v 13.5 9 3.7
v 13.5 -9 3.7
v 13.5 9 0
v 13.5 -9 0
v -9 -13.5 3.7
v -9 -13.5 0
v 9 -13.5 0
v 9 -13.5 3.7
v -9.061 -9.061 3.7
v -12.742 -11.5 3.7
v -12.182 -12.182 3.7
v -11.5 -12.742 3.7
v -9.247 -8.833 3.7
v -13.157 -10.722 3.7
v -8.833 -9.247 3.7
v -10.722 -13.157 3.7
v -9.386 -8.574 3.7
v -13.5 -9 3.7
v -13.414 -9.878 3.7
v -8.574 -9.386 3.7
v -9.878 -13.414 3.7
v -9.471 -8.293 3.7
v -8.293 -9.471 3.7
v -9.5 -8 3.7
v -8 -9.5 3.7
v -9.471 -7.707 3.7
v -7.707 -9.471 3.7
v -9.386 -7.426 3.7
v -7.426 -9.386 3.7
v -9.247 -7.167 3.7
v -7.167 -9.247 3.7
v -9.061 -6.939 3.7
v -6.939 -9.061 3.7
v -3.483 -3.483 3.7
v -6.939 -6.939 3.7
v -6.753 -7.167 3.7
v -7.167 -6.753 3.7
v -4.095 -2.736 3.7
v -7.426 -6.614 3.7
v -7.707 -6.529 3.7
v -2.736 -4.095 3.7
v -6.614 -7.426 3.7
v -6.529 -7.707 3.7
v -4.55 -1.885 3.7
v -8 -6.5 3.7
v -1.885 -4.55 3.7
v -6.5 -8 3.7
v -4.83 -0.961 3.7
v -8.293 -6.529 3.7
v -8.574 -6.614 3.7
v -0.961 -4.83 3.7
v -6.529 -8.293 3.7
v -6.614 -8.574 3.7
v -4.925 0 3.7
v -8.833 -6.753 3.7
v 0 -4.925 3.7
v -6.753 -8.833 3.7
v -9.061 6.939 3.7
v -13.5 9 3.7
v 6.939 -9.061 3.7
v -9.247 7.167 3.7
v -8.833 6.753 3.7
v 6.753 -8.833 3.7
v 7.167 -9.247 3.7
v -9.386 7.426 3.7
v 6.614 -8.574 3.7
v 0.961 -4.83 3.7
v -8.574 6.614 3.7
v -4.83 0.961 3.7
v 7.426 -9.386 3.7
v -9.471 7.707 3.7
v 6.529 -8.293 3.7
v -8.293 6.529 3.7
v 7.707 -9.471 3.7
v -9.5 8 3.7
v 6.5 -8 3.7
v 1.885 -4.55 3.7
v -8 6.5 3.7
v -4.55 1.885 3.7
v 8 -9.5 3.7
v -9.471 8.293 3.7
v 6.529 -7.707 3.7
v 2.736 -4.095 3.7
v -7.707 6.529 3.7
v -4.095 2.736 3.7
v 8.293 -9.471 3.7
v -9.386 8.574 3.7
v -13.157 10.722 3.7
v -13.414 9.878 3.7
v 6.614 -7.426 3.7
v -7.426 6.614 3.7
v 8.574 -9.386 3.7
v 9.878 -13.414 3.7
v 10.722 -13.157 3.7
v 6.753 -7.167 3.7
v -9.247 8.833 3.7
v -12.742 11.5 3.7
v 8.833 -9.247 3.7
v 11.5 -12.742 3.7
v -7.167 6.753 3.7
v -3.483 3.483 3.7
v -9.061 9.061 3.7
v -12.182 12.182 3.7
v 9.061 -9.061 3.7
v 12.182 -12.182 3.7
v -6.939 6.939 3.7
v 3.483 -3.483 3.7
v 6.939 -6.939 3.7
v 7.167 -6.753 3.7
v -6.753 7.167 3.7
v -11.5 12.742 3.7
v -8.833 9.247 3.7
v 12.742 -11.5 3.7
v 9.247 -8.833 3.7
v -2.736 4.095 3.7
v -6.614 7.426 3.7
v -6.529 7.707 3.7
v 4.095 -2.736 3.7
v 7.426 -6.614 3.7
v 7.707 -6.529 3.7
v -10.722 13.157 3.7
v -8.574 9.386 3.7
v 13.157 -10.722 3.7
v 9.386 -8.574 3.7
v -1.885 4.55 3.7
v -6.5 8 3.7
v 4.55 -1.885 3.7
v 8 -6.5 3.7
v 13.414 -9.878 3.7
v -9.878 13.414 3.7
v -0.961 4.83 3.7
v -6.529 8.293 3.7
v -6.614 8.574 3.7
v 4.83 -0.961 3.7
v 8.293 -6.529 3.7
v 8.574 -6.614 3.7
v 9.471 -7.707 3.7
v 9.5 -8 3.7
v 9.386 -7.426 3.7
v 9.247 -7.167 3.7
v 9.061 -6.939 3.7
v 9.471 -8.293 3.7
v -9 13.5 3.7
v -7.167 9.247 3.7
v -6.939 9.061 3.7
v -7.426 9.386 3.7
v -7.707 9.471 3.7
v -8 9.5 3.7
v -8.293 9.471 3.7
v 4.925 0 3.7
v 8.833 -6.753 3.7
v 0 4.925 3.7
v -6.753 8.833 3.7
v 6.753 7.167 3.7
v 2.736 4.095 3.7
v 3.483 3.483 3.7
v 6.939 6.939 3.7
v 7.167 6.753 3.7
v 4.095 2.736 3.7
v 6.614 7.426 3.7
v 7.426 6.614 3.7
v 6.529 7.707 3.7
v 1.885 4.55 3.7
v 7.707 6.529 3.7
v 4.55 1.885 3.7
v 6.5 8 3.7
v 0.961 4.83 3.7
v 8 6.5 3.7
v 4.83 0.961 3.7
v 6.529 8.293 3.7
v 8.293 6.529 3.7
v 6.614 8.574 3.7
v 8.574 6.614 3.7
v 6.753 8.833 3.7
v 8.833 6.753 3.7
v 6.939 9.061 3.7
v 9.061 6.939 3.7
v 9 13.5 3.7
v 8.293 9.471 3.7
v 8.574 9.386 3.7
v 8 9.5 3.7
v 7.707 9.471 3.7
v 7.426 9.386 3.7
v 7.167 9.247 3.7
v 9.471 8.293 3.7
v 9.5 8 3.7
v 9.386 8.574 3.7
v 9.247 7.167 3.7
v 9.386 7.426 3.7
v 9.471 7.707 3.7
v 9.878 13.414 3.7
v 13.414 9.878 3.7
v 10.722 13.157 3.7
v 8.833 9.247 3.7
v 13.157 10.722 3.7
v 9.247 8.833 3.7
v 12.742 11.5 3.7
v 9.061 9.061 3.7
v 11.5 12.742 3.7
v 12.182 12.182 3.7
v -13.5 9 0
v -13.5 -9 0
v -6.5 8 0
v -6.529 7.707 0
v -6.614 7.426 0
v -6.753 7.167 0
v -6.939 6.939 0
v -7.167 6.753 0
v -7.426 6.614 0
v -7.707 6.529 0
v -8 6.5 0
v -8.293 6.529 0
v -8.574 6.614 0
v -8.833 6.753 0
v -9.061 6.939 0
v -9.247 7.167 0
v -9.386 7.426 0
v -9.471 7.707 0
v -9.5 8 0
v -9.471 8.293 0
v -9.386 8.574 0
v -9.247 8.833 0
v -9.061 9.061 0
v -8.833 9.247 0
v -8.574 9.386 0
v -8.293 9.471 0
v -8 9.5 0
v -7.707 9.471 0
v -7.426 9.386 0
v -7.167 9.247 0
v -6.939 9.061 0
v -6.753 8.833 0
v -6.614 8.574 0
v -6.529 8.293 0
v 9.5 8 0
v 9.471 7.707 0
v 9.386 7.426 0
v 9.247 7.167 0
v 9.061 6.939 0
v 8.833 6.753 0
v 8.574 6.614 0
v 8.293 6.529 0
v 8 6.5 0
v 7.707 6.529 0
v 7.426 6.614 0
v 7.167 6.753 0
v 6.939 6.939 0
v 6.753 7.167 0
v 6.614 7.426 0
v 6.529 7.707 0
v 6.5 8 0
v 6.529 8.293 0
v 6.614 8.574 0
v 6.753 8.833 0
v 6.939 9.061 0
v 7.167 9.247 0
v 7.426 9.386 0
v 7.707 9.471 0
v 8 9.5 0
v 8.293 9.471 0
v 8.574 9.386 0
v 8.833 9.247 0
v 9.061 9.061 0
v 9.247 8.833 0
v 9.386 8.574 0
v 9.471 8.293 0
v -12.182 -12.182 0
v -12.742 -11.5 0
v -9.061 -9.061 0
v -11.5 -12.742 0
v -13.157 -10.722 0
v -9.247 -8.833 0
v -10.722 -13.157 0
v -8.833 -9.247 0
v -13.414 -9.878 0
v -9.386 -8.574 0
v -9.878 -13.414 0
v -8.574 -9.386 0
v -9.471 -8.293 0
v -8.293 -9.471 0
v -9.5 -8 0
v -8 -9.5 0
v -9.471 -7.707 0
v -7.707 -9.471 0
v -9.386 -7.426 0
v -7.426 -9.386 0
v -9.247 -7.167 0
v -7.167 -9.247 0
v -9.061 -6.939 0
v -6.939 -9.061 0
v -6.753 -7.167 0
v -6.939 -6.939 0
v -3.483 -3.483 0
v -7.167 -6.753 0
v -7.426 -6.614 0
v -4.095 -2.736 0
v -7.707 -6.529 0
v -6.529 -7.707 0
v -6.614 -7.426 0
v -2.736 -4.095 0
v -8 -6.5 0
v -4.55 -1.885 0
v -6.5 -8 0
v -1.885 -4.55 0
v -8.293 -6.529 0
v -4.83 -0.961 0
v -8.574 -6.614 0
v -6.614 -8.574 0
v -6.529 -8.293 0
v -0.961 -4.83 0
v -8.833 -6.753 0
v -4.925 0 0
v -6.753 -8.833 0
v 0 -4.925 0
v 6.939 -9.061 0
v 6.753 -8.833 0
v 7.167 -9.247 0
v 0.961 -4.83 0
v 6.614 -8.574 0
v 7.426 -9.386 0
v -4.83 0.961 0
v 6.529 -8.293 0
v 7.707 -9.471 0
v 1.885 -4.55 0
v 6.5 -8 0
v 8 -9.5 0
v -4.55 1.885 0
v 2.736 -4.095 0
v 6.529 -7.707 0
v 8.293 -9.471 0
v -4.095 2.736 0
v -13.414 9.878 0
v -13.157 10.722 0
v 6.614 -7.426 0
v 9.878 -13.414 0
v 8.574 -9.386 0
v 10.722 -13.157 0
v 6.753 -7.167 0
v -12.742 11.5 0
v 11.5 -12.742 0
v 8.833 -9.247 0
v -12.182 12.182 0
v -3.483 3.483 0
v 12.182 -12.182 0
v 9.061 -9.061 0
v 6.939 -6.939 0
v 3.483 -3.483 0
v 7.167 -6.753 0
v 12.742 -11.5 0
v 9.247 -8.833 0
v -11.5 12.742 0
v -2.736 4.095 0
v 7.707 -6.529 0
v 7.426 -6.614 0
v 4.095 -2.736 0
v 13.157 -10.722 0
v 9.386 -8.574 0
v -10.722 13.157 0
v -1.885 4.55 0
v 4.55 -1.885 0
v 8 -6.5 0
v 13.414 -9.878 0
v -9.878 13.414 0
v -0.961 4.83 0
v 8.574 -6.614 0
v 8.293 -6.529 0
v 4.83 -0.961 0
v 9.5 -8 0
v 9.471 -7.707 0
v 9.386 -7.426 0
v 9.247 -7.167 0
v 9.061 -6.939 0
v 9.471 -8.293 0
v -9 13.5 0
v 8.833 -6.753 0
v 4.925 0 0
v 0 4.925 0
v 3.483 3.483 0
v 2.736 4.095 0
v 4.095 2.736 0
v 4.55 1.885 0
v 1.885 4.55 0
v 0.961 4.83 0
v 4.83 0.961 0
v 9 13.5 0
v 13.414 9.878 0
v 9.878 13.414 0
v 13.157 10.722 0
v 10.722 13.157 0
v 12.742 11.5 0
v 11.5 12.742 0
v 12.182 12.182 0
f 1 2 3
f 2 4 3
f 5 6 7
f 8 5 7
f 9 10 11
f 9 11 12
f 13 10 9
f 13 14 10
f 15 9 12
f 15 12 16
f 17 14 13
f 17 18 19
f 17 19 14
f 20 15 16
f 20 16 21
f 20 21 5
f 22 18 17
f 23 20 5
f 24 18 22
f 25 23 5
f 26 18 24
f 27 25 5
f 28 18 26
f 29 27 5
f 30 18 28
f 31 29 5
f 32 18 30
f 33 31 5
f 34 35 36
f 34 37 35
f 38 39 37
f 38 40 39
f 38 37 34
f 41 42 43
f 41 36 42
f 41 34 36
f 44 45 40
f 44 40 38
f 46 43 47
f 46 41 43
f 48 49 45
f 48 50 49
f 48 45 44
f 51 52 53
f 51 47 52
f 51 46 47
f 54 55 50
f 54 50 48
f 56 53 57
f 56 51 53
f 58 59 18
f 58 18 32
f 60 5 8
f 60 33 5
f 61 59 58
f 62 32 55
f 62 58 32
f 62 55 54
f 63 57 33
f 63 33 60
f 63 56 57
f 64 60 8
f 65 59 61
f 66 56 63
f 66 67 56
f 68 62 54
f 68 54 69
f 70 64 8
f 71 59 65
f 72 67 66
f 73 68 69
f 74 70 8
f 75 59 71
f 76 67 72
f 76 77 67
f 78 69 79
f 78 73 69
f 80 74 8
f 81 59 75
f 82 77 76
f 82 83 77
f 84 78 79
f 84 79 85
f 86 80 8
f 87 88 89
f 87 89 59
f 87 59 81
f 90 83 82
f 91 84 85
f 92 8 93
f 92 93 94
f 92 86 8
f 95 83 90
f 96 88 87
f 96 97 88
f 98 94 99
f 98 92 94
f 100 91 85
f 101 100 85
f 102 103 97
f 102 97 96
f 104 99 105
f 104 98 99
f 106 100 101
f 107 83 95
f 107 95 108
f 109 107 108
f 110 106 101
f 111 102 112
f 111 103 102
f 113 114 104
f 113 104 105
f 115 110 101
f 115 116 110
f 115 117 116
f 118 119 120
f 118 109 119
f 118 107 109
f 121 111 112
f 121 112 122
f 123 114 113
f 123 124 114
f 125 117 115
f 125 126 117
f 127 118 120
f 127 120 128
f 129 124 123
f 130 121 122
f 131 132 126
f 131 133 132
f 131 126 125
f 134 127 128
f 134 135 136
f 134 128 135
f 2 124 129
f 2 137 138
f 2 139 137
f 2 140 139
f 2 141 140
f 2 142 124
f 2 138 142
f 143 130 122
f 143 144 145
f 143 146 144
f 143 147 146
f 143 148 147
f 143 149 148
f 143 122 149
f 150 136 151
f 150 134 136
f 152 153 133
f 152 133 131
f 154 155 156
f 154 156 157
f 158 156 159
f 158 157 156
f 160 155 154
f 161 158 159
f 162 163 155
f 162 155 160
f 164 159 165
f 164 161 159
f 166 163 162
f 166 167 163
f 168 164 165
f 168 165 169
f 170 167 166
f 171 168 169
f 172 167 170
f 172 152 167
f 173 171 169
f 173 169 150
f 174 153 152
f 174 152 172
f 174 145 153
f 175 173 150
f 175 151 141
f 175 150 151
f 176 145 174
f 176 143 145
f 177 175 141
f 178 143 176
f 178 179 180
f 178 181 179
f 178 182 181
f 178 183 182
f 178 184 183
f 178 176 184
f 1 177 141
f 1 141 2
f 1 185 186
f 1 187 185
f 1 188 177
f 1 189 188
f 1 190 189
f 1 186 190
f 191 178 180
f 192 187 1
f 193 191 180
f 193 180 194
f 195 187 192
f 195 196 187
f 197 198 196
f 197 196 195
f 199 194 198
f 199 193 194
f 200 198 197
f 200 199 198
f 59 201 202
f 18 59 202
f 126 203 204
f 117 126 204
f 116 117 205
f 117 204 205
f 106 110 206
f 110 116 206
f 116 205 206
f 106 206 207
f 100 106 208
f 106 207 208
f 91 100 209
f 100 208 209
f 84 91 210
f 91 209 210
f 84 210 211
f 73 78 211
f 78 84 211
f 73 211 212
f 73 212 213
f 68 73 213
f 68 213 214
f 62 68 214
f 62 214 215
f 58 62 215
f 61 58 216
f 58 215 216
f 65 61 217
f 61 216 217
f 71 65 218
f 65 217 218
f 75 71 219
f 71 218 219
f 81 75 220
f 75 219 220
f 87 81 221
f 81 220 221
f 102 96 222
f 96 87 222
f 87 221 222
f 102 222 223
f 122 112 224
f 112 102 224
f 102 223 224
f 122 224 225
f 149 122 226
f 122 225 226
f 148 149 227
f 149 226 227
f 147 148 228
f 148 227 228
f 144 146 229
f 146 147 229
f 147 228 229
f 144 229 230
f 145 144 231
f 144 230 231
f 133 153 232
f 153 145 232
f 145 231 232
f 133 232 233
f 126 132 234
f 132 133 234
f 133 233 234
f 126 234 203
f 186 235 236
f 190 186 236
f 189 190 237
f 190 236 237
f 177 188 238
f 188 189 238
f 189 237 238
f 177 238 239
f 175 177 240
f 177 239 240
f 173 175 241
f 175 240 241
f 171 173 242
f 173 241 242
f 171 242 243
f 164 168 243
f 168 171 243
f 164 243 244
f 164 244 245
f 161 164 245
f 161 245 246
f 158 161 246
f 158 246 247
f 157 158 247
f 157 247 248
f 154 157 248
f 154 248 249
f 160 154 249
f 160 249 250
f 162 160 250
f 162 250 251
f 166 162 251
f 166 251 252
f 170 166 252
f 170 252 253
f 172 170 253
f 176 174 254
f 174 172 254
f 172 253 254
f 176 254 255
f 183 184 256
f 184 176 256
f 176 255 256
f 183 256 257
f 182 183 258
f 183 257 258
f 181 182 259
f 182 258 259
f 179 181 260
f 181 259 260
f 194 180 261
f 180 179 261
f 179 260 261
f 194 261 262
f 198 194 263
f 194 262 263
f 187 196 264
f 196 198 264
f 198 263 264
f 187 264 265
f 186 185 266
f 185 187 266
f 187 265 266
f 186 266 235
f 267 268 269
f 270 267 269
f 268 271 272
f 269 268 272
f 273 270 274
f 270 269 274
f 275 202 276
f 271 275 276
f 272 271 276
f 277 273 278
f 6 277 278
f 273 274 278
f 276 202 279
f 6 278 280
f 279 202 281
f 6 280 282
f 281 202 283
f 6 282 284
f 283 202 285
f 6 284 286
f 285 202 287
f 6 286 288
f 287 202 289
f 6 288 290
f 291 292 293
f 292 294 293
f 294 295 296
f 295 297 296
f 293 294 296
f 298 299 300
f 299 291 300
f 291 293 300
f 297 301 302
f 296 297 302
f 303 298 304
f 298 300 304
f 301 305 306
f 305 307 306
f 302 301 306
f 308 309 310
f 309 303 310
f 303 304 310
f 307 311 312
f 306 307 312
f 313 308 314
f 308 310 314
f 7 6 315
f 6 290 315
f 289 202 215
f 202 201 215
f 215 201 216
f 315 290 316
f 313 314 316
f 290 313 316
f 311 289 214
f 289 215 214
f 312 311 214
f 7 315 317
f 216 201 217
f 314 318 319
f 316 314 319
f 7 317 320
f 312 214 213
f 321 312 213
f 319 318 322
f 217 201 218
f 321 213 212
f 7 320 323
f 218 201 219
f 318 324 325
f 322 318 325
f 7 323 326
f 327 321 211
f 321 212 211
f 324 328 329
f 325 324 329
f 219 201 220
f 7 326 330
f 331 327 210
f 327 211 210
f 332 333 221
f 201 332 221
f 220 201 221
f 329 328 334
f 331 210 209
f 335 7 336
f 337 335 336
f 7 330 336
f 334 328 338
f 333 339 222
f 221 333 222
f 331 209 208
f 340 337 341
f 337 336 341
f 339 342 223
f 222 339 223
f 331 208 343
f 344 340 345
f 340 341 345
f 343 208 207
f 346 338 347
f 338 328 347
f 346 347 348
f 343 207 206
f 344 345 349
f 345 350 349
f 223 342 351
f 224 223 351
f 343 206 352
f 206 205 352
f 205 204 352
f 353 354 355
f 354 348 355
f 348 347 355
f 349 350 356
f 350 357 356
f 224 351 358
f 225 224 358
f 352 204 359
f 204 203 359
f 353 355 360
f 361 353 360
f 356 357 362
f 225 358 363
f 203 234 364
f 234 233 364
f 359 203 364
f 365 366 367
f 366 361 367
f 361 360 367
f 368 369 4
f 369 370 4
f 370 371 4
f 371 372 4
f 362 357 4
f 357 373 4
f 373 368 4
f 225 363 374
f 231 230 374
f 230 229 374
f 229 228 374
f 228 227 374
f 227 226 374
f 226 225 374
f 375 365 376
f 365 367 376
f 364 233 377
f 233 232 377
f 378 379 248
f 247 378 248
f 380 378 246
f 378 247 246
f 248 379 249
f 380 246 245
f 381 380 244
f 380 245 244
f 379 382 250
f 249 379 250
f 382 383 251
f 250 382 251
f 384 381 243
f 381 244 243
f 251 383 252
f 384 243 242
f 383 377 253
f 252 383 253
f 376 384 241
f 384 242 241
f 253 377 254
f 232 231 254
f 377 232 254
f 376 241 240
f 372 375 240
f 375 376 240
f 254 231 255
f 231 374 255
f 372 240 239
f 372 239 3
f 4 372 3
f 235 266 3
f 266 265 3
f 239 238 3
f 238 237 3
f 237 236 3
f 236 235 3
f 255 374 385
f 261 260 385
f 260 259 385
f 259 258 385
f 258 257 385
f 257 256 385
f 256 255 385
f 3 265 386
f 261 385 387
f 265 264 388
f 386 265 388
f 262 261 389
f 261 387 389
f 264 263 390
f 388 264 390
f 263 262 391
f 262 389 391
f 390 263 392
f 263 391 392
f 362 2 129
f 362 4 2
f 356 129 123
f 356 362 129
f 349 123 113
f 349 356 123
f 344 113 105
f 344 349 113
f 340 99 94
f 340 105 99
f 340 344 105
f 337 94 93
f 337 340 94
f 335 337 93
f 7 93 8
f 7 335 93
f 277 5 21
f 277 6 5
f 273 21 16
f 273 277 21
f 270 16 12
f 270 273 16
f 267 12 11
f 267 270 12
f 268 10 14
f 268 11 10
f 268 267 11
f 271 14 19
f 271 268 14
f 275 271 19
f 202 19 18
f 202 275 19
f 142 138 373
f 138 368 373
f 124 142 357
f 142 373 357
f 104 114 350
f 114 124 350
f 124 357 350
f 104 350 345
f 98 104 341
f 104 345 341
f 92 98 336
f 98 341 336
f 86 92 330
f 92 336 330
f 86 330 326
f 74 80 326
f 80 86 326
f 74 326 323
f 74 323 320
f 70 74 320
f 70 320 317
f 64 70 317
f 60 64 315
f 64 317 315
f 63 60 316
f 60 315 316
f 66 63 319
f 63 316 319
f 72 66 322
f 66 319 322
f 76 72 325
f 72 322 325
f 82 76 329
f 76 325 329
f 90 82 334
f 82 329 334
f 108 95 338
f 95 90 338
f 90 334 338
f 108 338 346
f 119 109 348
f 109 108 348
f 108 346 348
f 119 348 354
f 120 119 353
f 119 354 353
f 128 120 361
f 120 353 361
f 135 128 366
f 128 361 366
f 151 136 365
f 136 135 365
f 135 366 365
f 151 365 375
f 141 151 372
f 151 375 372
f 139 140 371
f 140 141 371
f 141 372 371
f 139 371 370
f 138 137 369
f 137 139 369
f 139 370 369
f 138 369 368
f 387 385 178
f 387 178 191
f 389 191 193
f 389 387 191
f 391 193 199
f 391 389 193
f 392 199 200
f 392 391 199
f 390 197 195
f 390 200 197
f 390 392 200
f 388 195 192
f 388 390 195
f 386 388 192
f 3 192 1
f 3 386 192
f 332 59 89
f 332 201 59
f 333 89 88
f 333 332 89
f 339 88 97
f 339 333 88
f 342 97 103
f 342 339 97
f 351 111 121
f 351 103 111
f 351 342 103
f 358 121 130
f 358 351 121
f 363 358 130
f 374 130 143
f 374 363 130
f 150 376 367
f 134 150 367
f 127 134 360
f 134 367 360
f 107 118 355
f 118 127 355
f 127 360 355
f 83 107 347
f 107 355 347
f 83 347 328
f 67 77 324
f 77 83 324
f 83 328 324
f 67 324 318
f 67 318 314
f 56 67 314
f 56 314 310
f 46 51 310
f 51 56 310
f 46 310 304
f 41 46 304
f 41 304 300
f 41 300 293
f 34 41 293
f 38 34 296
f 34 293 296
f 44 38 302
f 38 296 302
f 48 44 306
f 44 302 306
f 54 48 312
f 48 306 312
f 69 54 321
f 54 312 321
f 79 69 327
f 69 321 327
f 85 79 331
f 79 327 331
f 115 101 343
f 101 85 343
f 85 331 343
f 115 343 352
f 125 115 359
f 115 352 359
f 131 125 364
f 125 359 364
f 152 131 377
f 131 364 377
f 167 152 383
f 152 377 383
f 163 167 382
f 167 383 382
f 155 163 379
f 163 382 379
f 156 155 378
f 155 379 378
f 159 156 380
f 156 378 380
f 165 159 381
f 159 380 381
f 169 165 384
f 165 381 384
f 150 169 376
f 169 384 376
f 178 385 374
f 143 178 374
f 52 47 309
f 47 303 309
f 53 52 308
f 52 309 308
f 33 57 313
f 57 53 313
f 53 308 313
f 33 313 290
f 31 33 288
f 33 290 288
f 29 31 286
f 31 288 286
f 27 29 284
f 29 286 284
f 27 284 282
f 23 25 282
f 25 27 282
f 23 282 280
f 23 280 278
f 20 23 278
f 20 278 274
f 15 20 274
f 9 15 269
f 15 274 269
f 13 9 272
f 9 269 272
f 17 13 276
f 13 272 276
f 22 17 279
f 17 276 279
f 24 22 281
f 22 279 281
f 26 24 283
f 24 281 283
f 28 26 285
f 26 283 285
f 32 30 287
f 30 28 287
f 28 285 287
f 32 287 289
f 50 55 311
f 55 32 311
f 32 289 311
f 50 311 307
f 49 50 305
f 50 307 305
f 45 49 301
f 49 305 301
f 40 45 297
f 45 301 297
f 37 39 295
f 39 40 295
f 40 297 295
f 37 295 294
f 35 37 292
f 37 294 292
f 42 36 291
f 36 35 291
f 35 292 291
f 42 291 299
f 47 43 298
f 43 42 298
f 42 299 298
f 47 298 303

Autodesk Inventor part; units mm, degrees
ref_plane "YZ Plane" through (0, 0, 0) normal (1, 0, 0) x (0, 1, 0)
ref_plane "XZ Plane" through (0, 0, 0) normal (0, 1, 0) x (-1, 0, 0)
ref_plane "XY Plane" through (0, 0, 0) normal (0, 0, 1) x (1, 0, 0)
sketch "Sketch1" plane through (0, 0, 0) normal (0, 0, 1) x (1, 0, 0)
  line L0 (-9, -13.5) -> (9, -13.5)
  line L1 (13.5, -9) -> (13.5, 9)
  line L2 (9, 13.5) -> (-9, 13.5)
  line L3 (-13.5, 9) -> (-13.5, -9)
  line L4 (-13.5, -13.5) -> (13.5, 13.5) construction
  line L5 (13.5, -13.5) -> (-13.5, 13.5) construction
  line L6 (-8, -8) -> (8, -8) construction
  line L7 (8, -8) -> (8, 8) construction
  line L8 (8, 8) -> (-8, 8) construction
  line L9 (-8, 8) -> (-8, -8) construction
  line L10 (-8, -8) -> (8, 8) construction
  line L11 (8, -8) -> (-8, 8) construction
  circle A0 centre (-8, 8) radius 1.5
  circle A1 centre (8, 8) radius 1.5
  circle A2 centre (-8, -8) radius 1.5
  circle A3 centre (8, -8) radius 1.5
  arc A4 (-9, 13.5) -> (-13.5, 9) centre (-9, 9) ccw
  arc A5 (-13.5, -9) -> (-9, -13.5) centre (-9, -9) ccw
  arc A6 (9, -13.5) -> (13.5, -9) centre (9, -9) ccw
  arc A7 (13.5, 9) -> (9, 13.5) centre (9, 9) ccw
  circle A8 centre (0, 0) radius 4.925
  dimension "d0" = 27
  dimension "d1" = 27
  dimension "d2" = 16
  dimension "d3" = 16
  dimension "d4" = 3
  dimension "d5" = 3
  dimension "d6" = 3
  dimension "d7" = 3
  dimension "d8" = 4.5
  dimension "d9" = 9.85
extrude "Extrusion1" add sketch "Sketch1" along normal blind 3.7
properties part number "Tope_rodamiento" material "PMMA Plastic"
